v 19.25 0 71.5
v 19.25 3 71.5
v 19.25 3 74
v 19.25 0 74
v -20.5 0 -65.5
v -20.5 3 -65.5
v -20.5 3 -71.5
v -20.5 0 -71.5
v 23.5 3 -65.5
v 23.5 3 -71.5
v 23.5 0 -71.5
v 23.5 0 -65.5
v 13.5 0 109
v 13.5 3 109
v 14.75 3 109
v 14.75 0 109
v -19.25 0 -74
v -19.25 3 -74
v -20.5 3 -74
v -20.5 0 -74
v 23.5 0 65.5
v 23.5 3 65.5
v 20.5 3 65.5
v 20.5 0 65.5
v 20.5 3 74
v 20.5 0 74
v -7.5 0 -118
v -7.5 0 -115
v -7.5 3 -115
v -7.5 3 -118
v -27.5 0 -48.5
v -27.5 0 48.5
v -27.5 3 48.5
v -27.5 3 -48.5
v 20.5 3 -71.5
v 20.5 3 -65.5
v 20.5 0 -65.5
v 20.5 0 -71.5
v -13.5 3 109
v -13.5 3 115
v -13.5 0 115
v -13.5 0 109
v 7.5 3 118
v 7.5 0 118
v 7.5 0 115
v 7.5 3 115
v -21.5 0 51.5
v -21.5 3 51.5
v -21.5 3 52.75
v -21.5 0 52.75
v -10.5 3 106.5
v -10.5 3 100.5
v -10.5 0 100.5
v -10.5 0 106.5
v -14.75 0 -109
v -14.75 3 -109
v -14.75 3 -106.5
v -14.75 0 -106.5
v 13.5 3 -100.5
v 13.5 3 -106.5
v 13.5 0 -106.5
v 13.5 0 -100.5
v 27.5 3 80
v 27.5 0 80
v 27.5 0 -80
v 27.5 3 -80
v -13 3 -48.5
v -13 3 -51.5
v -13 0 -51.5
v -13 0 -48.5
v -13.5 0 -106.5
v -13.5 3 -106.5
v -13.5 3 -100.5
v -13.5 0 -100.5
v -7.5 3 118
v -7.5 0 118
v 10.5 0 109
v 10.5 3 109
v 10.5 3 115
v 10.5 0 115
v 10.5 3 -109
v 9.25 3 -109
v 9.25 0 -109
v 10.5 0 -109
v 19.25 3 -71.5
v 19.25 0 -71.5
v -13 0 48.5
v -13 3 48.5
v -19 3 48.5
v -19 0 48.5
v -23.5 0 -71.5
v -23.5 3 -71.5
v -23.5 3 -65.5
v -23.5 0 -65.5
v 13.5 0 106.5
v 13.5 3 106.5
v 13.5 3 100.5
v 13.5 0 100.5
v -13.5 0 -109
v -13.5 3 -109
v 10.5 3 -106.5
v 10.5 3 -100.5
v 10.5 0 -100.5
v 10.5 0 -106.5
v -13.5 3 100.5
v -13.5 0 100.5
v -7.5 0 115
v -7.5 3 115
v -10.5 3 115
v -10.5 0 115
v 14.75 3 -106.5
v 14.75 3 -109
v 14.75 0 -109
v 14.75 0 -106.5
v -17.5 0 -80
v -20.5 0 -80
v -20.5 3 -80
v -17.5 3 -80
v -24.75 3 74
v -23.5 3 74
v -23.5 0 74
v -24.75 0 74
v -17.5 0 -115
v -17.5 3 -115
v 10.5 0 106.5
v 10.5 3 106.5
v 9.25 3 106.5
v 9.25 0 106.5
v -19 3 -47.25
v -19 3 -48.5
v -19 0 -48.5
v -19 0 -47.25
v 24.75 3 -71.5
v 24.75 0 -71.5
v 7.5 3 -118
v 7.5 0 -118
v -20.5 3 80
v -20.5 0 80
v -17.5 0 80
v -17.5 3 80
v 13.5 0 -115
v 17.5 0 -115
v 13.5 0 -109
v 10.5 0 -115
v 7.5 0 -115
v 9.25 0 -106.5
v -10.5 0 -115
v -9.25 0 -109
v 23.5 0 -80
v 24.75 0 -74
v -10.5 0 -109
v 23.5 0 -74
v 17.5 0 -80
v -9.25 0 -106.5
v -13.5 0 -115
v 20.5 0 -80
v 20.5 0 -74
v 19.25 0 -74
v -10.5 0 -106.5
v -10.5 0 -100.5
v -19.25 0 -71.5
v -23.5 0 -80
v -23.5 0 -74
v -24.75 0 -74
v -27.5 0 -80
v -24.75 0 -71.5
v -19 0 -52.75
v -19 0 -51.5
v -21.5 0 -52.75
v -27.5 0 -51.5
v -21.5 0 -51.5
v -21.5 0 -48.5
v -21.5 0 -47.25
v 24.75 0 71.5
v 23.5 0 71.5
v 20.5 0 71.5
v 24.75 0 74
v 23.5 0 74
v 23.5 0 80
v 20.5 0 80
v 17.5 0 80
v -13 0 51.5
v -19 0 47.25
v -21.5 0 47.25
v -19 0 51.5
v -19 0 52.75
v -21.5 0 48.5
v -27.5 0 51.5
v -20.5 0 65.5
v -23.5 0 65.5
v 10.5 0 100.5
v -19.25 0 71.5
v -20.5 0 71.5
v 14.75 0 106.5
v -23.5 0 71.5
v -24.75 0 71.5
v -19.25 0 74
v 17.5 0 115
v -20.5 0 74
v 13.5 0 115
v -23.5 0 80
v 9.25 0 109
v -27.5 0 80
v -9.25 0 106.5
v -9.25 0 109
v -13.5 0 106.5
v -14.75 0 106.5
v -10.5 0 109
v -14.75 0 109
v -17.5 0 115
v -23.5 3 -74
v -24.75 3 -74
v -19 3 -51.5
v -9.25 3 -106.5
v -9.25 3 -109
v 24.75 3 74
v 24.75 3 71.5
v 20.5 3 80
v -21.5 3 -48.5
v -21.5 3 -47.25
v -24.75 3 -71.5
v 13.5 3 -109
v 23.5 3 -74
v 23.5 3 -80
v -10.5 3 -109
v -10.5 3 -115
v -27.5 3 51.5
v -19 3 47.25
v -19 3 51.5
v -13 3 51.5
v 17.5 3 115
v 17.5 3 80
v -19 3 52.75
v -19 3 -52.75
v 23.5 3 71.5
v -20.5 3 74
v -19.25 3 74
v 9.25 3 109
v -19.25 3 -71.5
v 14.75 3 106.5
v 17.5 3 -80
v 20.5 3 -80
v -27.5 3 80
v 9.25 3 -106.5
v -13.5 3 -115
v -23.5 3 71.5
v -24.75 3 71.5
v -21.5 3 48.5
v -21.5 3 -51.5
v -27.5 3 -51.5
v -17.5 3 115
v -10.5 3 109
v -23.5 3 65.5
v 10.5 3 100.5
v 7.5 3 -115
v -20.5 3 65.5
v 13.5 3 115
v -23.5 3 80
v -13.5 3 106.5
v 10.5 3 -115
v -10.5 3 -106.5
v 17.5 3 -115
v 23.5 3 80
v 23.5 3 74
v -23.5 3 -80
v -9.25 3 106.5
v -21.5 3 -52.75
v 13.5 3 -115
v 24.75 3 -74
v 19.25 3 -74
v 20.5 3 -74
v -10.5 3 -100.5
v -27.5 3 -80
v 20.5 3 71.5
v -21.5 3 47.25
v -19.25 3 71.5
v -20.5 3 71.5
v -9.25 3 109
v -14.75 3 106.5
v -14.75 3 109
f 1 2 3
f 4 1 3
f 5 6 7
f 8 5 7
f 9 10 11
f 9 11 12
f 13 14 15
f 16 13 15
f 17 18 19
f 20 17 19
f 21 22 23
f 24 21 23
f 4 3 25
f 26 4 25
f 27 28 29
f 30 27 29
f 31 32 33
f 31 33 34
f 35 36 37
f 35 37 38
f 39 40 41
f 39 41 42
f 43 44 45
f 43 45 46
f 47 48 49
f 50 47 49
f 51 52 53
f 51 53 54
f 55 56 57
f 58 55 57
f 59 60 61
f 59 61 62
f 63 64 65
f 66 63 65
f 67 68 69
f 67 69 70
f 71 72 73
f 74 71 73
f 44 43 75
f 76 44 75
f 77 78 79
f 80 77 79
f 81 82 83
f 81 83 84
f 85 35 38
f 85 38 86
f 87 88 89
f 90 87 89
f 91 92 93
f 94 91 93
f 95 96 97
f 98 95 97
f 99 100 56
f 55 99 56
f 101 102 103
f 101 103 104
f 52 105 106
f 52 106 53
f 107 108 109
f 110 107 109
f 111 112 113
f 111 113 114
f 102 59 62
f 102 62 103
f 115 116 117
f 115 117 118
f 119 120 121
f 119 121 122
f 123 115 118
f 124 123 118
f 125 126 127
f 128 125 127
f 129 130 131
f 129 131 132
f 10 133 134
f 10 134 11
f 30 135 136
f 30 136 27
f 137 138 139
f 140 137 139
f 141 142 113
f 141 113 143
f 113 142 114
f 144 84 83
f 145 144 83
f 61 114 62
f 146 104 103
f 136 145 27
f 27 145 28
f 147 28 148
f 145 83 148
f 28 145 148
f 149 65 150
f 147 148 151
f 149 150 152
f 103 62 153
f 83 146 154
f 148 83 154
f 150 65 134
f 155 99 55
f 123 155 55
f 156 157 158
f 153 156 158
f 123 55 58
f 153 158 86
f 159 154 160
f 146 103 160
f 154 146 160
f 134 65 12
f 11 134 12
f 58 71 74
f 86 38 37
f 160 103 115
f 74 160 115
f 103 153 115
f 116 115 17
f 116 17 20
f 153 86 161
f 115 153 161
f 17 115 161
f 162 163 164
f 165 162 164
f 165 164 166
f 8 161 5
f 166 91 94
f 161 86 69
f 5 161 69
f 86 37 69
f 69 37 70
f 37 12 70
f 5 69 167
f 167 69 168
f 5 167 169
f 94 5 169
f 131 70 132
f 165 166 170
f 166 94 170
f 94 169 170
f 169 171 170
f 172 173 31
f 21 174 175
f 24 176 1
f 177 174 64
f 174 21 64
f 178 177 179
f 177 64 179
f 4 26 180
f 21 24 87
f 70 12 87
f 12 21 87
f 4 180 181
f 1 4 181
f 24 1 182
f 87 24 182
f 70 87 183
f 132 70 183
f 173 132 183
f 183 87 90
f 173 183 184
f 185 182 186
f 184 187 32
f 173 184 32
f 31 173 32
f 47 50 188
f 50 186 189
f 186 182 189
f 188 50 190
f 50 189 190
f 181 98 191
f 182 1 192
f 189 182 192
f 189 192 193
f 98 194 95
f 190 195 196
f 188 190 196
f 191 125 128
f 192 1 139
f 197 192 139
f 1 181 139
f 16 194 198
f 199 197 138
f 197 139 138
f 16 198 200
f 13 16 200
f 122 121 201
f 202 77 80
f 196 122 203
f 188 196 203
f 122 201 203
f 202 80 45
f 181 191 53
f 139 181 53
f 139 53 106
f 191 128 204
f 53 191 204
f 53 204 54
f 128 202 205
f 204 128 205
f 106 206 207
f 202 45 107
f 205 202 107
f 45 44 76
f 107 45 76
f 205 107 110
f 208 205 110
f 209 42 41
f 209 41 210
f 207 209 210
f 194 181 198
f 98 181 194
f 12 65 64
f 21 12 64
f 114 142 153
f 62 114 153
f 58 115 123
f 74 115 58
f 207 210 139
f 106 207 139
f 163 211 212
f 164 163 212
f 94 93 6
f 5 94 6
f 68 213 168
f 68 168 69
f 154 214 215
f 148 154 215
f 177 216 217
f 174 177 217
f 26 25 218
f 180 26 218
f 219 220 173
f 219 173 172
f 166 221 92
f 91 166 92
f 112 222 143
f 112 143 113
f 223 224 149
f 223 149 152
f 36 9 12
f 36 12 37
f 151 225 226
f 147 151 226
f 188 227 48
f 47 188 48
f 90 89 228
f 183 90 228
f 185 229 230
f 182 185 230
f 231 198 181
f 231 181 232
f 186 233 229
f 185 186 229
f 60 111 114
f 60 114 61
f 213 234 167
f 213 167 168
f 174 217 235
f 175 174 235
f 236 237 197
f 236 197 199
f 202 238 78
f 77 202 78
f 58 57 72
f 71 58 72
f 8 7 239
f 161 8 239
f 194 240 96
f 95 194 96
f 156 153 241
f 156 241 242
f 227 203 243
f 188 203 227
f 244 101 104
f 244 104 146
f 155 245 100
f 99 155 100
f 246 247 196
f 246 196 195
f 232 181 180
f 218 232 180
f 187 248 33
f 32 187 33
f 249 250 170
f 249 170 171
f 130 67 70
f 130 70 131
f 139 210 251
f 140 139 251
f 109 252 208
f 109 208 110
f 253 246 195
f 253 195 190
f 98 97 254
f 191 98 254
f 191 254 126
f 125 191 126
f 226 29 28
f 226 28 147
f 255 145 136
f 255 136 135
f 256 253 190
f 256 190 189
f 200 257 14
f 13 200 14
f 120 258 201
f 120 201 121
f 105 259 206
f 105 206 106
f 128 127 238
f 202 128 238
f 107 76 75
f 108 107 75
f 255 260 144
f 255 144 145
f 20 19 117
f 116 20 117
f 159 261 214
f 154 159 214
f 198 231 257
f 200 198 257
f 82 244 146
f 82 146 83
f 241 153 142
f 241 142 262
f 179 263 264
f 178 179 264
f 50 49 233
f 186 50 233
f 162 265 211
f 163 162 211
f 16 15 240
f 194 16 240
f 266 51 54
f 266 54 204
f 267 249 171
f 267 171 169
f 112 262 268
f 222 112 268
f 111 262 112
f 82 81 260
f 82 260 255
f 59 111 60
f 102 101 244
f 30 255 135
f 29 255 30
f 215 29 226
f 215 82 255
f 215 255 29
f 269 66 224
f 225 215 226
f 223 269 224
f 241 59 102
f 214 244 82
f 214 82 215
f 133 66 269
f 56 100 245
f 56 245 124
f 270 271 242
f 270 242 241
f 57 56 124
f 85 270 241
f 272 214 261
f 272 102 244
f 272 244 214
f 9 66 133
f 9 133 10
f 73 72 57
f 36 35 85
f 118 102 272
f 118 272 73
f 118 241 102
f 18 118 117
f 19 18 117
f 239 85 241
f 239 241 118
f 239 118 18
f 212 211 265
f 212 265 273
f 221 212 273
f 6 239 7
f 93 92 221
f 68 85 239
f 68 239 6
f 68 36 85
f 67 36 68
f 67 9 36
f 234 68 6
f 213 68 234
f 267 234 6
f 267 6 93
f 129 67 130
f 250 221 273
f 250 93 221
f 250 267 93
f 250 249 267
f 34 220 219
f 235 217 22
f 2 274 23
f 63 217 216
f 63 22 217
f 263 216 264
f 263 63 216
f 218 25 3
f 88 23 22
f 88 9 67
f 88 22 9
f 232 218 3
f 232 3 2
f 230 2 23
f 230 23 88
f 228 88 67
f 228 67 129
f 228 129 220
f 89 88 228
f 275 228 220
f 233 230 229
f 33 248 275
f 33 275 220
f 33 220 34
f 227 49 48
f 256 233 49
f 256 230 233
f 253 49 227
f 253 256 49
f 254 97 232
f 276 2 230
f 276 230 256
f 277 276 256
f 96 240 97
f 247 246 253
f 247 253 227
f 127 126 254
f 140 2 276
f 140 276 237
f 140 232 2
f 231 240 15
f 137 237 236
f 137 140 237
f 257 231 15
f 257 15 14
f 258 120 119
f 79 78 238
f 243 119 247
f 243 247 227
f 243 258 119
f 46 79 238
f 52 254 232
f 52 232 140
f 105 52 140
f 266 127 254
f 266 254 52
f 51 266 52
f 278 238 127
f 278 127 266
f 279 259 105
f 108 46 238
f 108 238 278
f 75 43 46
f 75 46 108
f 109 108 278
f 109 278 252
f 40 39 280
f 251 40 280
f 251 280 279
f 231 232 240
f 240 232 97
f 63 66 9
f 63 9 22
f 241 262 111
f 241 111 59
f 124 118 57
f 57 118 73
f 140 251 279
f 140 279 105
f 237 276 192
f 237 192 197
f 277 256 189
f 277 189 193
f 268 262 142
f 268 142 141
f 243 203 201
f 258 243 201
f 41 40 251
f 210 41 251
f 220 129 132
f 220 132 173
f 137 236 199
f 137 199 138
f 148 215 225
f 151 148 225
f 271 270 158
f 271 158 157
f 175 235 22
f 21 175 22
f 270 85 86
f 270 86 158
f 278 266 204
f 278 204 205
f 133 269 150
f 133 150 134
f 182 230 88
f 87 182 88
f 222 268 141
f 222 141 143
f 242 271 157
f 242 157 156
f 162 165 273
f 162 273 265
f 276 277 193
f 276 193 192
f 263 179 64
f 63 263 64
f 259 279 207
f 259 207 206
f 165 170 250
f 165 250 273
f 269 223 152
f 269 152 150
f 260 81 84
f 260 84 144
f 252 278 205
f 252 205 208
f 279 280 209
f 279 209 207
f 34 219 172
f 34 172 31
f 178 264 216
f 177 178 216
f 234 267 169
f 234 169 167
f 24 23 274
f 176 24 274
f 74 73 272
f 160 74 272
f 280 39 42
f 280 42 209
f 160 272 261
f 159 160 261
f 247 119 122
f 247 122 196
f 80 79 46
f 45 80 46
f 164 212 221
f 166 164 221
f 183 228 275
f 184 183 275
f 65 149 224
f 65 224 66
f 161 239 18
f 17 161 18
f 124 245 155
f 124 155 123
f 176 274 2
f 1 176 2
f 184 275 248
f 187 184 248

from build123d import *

# Parameters (mm, degrees)
SKETCH_1_W           = 55
SKETCH_1_H           = 160
EXTRUDE_1_DEPTH      = 3
EXTRUDE_2_DEPTH      = 35
EXTRUDE_2_DEPTH_BACK = 195
SKETCH_2_W           = 35
SKETCH_2_H           = 3
EXTRUDE_3_DEPTH      = 3
EXTRUDE_3_DEPTH_BACK = 233
SKETCH_3_W           = 15
SKETCH_3_H           = 3
CUT_EXTRUDE_1_DEPTH  = 3
CUT_EXTRUDE_2_DEPTH  = 3


with BuildPart() as part:
    # Эскиз1 → Бобышка-Вытянуть1 (new body)
    with BuildSketch(Plane(origin=(0, 0, 0), x_dir=(1, 0, 0), z_dir=(0, 1, 0))):
        Rectangle(SKETCH_1_W, SKETCH_1_H)
    extrude(amount=EXTRUDE_1_DEPTH)

    # Эскиз2 → Бобышка-Вытянуть2 (add, two sides: drawn at the far end of the back side and taken through both)
    with BuildSketch(Plane(origin=(0, 0, -80), x_dir=(-1, 0, 0), z_dir=(0, 0, -1)).offset(-EXTRUDE_2_DEPTH_BACK)):
        with Locations((0, 1.5)):
            Rectangle(SKETCH_2_W, SKETCH_2_H)
    extrude(amount=EXTRUDE_2_DEPTH + EXTRUDE_2_DEPTH_BACK)

    # Эскиз3 → Бобышка-Вытянуть3 (add, two sides: drawn at the far end of the back side and taken through both)
    with BuildSketch(Plane(origin=(0, 0, -115), x_dir=(-1, 0, 0), z_dir=(0, 0, -1)).offset(-EXTRUDE_3_DEPTH_BACK)):
        with Locations((0, 1.5)):
            Rectangle(SKETCH_3_W, SKETCH_3_H)
    extrude(amount=EXTRUDE_3_DEPTH + EXTRUDE_3_DEPTH_BACK)

    # Эскиз4 → Вырез-Вытянуть1 (cut)
    with BuildSketch(Plane(origin=(0, 3, 0), x_dir=(1, 0, 0), z_dir=(0, 1, 0))):
        Polygon((-23.5, 80), (-23.5, 74), (-24.75, 74), (-24.75, 71.5), (-23.5, 71.5), (-23.5, 65.5), (-20.5, 65.5), (-20.5, 71.5), (-19.25, 71.5), (-19.25, 74), (-20.5, 74), (-20.5, 80), align=None)
        Polygon((-13.5, 115), (-13.5, 109), (-14.75, 109), (-14.75, 106.5), (-13.5, 106.5), (-13.5, 100.5), (-10.5, 100.5), (-10.5, 106.5), (-9.25, 106.5), (-9.25, 109), (-10.5, 109), (-10.5, 115), align=None)
        Polygon((10.5, 115), (13.5, 115), (13.5, 109), (14.75, 109), (14.75, 106.5), (13.5, 106.5), (13.5, 100.5), (10.5, 100.5), (10.5, 106.5), (9.25, 106.5), (9.25, 109), (10.5, 109), align=None)
        Polygon((20.5, 80), (23.5, 80), (23.5, 74), (24.75, 74), (24.75, 71.5), (23.5, 71.5), (23.5, 65.5), (20.5, 65.5), (20.5, 71.5), (19.25, 71.5), (19.25, 74), (20.5, 74), align=None)
        Polygon((-10.5, -115), (-13.5, -115), (-13.5, -109), (-14.75, -109), (-14.75, -106.5), (-13.5, -106.5), (-13.5, -100.5), (-10.5, -100.5), (-10.5, -106.5), (-9.25, -106.5), (-9.25, -109), (-10.5, -109), align=None)
        Polygon((13.5, -115), (13.5, -109), (14.75, -109), (14.75, -106.5), (13.5, -106.5), (13.5, -100.5), (10.5, -100.5), (10.5, -106.5), (9.25, -106.5), (9.25, -109), (10.5, -109), (10.5, -115), align=None)
        Polygon((-20.5, -80), (-23.5, -80), (-23.5, -74), (-24.75, -74), (-24.75, -71.5), (-23.5, -71.5), (-23.5, -65.5), (-20.5, -65.5), (-20.5, -71.5), (-19.25, -71.5), (-19.25, -74), (-20.5, -74), align=None)
        Polygon((23.5, -80), (23.5, -74), (24.75, -74), (24.75, -71.5), (23.5, -71.5), (23.5, -65.5), (20.5, -65.5), (20.5, -71.5), (19.25, -71.5), (19.25, -74), (20.5, -74), (20.5, -80), align=None)
    extrude(amount=-CUT_EXTRUDE_1_DEPTH, mode=Mode.SUBTRACT)

    # Эскиз5 → Вырез-Вытянуть2 (cut)
    with BuildSketch(Plane(origin=(0, 3, 0), x_dir=(1, 0, 0), z_dir=(0, 1, 0))):
        Polygon((-27.5, 51.5), (-21.5, 51.5), (-21.5, 52.75), (-19, 52.75), (-19, 51.5), (-13, 51.5), (-13, 48.5), (-19, 48.5), (-19, 47.25), (-21.5, 47.25), (-21.5, 48.5), (-27.5, 48.5), align=None)
        Polygon((-27.5, -48.5), (-27.5, -51.5), (-21.5, -51.5), (-21.5, -52.75), (-19, -52.75), (-19, -51.5), (-13, -51.5), (-13, -48.5), (-19, -48.5), (-19, -47.25), (-21.5, -47.25), (-21.5, -48.5), align=None)
    extrude(amount=-CUT_EXTRUDE_2_DEPTH, mode=Mode.SUBTRACT)


solid = part.part
